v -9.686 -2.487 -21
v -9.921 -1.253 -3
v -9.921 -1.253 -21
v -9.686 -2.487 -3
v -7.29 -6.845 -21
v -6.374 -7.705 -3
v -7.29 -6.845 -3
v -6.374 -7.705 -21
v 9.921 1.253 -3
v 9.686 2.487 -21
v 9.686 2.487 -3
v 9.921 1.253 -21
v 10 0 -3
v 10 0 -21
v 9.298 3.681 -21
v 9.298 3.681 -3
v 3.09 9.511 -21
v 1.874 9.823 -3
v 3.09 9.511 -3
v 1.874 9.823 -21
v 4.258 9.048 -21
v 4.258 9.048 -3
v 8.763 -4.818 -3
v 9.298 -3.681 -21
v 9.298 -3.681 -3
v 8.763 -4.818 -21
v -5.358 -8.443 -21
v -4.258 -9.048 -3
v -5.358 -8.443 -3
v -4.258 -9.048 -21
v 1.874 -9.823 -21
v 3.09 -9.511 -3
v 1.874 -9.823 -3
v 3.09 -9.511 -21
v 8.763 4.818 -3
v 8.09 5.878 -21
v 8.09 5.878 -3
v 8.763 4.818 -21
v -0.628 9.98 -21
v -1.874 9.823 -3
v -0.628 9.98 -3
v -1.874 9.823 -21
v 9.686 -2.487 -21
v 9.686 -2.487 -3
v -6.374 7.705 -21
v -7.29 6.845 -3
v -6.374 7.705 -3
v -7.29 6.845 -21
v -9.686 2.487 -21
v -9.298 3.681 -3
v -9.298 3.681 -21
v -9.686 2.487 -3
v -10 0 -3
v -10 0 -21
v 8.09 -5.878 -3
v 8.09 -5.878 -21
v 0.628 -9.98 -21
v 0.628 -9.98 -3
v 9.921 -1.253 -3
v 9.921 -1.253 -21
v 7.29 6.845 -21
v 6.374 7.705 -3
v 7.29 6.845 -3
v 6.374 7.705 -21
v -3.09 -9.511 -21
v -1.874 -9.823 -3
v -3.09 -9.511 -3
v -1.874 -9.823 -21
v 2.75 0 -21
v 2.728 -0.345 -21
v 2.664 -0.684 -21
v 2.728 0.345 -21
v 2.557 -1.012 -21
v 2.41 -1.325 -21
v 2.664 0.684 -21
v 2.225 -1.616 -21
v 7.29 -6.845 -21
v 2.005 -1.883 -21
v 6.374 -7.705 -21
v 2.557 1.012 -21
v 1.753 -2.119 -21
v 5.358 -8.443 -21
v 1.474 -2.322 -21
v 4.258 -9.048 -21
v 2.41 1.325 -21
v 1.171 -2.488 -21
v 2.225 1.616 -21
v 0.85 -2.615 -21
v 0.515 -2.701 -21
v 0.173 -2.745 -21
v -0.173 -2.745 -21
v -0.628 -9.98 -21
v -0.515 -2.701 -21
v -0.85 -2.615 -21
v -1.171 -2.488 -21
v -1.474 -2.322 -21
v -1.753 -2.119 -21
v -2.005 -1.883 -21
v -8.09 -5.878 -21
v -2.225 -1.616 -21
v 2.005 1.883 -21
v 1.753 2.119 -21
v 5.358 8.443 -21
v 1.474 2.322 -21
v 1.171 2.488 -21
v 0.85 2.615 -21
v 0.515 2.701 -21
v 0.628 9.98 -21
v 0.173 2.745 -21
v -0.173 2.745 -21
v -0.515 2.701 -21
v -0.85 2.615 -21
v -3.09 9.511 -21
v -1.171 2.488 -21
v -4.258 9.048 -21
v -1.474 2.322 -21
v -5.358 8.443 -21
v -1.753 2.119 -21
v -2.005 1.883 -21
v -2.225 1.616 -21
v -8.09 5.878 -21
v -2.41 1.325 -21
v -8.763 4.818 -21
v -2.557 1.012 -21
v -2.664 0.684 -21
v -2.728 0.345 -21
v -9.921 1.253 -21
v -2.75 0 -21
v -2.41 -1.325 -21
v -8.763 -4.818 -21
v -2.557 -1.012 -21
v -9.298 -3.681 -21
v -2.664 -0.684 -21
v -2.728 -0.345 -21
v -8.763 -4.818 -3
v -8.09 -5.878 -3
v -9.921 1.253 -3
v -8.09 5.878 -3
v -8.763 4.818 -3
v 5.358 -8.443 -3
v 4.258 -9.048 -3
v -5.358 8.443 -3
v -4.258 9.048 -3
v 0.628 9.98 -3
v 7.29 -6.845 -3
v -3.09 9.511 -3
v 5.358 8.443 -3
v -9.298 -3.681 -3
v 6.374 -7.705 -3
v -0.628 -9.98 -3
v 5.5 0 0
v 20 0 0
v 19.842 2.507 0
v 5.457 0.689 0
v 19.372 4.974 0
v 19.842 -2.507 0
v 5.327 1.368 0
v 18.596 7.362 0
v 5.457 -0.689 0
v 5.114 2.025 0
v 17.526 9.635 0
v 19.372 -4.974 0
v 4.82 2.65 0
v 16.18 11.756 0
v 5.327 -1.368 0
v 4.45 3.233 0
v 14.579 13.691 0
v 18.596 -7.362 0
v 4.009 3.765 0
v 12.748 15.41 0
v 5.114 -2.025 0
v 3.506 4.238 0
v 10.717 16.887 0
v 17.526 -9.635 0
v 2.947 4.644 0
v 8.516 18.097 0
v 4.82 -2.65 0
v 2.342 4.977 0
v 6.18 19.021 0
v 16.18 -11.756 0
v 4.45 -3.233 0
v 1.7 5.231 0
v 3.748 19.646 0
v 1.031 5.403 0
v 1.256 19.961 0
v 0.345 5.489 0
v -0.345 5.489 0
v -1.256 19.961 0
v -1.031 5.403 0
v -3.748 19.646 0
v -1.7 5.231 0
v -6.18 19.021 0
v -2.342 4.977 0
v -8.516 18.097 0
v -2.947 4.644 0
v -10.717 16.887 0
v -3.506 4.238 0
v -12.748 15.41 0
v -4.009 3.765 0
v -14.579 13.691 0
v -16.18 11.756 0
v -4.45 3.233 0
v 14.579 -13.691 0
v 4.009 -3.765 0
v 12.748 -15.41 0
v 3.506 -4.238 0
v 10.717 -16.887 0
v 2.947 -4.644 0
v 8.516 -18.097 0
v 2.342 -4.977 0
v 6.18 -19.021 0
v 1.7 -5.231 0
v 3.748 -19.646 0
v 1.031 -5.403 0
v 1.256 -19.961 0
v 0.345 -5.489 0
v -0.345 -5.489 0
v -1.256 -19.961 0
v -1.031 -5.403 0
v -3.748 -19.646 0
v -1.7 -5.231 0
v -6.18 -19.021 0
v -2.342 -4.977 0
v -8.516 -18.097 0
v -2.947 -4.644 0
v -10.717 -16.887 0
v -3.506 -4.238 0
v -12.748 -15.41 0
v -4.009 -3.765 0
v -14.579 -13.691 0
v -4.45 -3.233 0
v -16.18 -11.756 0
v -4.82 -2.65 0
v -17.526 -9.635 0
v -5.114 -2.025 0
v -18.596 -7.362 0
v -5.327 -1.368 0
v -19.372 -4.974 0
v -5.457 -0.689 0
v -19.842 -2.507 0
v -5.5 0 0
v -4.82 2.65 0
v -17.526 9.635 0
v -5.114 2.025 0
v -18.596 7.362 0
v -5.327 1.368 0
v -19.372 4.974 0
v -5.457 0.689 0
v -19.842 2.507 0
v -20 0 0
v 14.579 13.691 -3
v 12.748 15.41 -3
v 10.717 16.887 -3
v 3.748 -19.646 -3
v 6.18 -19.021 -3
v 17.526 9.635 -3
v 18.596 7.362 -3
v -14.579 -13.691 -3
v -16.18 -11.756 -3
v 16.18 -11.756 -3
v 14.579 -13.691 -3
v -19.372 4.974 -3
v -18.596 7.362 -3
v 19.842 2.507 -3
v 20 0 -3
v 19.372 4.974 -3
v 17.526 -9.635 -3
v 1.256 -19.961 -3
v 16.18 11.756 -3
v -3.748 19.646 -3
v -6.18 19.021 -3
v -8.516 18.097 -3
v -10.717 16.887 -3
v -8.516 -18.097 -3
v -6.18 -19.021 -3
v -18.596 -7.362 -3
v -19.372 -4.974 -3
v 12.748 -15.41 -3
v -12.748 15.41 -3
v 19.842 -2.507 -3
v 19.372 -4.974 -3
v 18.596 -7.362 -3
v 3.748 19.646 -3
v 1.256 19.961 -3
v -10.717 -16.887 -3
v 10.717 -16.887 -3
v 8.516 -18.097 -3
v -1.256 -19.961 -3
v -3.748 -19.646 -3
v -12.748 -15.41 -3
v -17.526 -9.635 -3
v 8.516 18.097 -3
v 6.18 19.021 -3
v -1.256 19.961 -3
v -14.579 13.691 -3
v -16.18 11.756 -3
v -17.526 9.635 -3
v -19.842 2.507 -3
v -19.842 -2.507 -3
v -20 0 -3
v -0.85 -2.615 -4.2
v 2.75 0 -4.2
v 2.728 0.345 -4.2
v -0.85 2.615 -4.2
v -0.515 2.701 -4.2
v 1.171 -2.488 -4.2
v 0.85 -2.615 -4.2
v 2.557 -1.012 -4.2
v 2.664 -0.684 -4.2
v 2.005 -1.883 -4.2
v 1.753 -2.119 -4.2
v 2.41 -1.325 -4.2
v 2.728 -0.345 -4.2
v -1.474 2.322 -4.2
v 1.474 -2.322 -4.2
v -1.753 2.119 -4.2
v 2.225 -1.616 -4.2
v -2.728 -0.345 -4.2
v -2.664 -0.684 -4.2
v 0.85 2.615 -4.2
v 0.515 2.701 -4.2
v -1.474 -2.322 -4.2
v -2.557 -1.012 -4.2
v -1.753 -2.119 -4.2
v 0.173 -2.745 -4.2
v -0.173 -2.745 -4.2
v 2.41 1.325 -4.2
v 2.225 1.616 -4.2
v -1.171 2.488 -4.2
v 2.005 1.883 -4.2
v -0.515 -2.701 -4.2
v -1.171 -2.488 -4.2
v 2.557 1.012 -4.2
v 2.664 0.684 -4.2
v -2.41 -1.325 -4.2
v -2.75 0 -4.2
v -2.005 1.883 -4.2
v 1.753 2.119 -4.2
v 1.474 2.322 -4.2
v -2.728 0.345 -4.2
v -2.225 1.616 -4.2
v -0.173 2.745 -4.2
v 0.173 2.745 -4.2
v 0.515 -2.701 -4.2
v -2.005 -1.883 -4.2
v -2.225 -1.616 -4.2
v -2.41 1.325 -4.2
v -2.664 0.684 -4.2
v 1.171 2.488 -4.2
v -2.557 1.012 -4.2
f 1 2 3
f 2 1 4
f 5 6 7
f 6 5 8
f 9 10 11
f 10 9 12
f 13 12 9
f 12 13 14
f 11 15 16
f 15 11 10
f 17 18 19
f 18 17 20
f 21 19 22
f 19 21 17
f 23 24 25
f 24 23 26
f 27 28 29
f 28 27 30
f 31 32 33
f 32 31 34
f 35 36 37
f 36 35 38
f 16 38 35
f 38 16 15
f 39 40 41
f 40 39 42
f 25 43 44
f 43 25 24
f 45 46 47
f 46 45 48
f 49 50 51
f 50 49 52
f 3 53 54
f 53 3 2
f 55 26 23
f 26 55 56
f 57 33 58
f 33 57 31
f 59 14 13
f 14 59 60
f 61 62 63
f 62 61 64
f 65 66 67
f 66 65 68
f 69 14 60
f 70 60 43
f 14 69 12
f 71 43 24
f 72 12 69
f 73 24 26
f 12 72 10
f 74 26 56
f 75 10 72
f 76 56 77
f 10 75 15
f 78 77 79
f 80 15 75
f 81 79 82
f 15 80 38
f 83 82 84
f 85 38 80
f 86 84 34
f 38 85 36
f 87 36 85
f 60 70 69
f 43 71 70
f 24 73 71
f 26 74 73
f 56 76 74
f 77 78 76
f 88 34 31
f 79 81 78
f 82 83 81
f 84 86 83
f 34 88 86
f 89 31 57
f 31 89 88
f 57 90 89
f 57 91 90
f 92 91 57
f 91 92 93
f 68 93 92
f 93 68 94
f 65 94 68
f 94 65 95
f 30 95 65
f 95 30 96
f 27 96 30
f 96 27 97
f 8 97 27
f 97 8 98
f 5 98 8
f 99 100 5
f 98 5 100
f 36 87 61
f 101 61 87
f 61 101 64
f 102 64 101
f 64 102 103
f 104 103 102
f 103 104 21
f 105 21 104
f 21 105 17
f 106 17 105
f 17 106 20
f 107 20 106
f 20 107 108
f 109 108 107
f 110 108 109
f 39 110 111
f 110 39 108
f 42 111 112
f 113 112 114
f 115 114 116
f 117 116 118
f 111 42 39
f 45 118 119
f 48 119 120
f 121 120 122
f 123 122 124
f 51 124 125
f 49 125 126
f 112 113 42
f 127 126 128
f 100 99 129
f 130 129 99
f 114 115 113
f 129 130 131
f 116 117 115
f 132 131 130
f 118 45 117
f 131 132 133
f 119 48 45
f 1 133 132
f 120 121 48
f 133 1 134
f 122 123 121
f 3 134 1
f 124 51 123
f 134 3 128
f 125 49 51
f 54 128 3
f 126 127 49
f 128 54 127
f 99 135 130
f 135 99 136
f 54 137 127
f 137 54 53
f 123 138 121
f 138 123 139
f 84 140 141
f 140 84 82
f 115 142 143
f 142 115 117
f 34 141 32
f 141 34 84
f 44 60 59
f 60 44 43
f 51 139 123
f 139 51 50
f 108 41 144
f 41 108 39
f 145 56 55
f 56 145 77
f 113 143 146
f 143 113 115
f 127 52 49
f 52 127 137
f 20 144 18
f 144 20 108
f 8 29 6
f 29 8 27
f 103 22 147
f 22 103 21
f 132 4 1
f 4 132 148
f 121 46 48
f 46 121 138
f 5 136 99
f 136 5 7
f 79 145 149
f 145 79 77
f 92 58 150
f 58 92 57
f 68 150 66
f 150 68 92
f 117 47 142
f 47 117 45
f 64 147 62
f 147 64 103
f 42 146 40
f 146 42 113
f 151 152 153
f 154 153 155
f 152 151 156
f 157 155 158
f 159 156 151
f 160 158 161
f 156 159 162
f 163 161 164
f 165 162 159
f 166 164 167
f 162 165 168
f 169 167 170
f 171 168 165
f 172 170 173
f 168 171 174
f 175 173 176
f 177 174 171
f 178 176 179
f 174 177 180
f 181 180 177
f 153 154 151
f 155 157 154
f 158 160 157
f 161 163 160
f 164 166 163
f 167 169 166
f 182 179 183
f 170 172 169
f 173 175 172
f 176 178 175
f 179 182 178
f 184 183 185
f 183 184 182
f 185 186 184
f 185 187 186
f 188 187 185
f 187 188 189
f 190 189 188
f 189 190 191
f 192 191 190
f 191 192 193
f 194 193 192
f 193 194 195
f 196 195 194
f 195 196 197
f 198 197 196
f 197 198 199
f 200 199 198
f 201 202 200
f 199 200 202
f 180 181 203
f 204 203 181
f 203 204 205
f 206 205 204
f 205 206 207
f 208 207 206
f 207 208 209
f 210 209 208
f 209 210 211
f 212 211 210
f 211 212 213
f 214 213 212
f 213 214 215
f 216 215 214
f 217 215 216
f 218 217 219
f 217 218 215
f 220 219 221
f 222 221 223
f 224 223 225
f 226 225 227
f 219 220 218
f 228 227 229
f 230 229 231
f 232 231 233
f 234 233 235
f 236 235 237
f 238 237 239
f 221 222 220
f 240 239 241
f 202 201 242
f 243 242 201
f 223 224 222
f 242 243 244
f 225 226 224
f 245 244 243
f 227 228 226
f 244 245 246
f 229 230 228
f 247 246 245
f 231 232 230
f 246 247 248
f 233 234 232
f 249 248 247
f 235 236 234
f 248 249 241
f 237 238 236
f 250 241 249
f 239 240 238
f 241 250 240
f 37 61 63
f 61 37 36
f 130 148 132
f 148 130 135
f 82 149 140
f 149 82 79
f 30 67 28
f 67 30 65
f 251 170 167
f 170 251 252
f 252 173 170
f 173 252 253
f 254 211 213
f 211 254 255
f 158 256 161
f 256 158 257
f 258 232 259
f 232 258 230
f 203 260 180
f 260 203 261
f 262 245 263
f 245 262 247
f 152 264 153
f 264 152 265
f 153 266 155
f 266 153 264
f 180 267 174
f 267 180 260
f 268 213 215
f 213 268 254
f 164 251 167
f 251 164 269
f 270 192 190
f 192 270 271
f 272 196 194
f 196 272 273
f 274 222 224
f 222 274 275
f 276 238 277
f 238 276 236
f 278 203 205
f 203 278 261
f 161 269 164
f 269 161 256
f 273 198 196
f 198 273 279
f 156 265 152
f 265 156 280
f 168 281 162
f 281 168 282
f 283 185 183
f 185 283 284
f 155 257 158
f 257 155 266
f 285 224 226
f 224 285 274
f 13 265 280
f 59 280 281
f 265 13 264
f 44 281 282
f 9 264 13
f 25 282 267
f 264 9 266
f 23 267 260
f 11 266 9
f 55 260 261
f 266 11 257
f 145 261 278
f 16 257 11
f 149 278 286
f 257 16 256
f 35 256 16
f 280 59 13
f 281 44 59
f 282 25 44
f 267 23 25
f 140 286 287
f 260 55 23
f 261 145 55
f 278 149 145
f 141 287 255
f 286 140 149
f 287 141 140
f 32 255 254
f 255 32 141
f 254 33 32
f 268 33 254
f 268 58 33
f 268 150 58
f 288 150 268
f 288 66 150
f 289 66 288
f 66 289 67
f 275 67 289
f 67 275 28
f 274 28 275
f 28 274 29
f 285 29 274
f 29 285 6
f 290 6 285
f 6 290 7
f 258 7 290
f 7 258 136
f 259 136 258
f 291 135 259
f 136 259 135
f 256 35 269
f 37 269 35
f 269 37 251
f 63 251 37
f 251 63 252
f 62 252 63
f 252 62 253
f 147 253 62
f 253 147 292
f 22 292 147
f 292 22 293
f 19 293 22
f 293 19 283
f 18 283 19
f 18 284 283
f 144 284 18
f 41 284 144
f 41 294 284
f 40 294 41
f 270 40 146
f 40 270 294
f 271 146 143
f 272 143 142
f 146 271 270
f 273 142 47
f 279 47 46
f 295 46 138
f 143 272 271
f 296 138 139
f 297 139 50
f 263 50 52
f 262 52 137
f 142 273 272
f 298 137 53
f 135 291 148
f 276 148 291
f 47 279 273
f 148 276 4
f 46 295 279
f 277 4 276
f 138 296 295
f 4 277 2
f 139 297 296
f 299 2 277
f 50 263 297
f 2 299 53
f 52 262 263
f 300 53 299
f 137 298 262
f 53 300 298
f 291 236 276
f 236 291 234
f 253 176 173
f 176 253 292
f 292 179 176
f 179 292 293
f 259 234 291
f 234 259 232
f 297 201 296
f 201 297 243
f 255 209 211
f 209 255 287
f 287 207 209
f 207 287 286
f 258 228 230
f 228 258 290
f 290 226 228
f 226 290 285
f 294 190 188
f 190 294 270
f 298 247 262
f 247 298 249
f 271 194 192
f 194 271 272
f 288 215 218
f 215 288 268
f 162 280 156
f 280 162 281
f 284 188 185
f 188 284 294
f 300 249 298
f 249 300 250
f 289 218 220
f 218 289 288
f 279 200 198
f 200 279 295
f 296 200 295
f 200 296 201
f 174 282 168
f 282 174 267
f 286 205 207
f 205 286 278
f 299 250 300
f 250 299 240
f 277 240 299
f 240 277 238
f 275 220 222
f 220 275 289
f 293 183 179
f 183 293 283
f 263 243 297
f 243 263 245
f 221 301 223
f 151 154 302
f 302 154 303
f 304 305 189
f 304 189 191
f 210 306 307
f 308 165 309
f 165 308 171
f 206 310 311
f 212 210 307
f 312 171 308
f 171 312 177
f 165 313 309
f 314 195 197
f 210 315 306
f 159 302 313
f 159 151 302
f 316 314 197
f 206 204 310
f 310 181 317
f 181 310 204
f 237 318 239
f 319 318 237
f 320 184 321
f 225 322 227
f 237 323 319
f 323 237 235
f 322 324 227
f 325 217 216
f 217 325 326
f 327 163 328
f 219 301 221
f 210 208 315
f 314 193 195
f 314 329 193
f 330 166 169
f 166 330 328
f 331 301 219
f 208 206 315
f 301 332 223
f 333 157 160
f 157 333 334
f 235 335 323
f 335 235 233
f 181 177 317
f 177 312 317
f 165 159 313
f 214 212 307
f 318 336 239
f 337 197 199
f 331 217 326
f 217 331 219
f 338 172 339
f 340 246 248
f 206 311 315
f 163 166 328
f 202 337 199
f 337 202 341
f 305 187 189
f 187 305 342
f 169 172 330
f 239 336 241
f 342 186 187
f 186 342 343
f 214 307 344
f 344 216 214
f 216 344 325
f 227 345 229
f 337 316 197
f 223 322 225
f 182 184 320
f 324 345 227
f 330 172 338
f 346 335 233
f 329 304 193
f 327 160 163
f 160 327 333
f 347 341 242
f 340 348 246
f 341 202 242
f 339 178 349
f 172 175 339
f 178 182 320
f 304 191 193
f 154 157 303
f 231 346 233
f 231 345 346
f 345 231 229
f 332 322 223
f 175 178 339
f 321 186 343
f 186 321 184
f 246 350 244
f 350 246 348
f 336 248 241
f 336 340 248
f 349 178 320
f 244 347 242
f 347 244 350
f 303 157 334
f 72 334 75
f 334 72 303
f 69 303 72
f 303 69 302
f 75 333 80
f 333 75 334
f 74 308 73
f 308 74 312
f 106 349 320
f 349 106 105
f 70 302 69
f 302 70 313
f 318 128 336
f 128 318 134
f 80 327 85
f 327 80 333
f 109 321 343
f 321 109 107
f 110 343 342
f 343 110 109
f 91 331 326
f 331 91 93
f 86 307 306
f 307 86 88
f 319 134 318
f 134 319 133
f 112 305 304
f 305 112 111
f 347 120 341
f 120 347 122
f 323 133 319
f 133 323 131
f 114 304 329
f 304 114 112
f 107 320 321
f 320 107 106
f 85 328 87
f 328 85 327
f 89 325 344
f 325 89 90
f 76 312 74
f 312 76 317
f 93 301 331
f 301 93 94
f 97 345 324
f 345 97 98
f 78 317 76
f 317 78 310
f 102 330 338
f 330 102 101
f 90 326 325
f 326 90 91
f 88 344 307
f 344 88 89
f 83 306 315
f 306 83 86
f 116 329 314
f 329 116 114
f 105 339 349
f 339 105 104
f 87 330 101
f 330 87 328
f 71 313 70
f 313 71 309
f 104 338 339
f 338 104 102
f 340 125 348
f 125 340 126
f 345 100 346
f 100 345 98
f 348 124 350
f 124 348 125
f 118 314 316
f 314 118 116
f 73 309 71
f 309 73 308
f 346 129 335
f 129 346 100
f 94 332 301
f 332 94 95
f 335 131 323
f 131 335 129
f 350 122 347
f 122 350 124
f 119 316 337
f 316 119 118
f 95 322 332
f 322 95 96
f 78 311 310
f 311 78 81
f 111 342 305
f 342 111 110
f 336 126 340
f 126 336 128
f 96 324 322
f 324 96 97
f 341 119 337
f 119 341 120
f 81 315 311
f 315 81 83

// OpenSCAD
$fn = 50;


difference() {
	union() {
		translate(v = [0, 0, -21.0000000000]) {
			cylinder(h = 21, r = 10.0000000000);
		}
		translate(v = [0, 0, -3.0000000000]) {
			cylinder(h = 3, r = 20.0000000000);
		}
	}
	union() {
		translate(v = [0, 0, 0]) {
			rotate(a = [0, 0, 0]) {
				difference() {
					union() {
						#translate(v = [0, 0, -21.0000000000]) {
							cylinder(h = 21, r = 2.2500000000);
						}
						#translate(v = [0, 0, -4.2000000000]) {
							cylinder(h = 4.2000000000, r1 = 2.7500000000, r2 = 5.5000000000);
						}
						#translate(v = [0, 0, -21.0000000000]) {
							cylinder(h = 21, r = 2.7500000000);
						}
						#translate(v = [0, 0, -21.0000000000]) {
							cylinder(h = 21, r = 2.2500000000);
						}
					}
					union();
				}
			}
		}
	}
}
